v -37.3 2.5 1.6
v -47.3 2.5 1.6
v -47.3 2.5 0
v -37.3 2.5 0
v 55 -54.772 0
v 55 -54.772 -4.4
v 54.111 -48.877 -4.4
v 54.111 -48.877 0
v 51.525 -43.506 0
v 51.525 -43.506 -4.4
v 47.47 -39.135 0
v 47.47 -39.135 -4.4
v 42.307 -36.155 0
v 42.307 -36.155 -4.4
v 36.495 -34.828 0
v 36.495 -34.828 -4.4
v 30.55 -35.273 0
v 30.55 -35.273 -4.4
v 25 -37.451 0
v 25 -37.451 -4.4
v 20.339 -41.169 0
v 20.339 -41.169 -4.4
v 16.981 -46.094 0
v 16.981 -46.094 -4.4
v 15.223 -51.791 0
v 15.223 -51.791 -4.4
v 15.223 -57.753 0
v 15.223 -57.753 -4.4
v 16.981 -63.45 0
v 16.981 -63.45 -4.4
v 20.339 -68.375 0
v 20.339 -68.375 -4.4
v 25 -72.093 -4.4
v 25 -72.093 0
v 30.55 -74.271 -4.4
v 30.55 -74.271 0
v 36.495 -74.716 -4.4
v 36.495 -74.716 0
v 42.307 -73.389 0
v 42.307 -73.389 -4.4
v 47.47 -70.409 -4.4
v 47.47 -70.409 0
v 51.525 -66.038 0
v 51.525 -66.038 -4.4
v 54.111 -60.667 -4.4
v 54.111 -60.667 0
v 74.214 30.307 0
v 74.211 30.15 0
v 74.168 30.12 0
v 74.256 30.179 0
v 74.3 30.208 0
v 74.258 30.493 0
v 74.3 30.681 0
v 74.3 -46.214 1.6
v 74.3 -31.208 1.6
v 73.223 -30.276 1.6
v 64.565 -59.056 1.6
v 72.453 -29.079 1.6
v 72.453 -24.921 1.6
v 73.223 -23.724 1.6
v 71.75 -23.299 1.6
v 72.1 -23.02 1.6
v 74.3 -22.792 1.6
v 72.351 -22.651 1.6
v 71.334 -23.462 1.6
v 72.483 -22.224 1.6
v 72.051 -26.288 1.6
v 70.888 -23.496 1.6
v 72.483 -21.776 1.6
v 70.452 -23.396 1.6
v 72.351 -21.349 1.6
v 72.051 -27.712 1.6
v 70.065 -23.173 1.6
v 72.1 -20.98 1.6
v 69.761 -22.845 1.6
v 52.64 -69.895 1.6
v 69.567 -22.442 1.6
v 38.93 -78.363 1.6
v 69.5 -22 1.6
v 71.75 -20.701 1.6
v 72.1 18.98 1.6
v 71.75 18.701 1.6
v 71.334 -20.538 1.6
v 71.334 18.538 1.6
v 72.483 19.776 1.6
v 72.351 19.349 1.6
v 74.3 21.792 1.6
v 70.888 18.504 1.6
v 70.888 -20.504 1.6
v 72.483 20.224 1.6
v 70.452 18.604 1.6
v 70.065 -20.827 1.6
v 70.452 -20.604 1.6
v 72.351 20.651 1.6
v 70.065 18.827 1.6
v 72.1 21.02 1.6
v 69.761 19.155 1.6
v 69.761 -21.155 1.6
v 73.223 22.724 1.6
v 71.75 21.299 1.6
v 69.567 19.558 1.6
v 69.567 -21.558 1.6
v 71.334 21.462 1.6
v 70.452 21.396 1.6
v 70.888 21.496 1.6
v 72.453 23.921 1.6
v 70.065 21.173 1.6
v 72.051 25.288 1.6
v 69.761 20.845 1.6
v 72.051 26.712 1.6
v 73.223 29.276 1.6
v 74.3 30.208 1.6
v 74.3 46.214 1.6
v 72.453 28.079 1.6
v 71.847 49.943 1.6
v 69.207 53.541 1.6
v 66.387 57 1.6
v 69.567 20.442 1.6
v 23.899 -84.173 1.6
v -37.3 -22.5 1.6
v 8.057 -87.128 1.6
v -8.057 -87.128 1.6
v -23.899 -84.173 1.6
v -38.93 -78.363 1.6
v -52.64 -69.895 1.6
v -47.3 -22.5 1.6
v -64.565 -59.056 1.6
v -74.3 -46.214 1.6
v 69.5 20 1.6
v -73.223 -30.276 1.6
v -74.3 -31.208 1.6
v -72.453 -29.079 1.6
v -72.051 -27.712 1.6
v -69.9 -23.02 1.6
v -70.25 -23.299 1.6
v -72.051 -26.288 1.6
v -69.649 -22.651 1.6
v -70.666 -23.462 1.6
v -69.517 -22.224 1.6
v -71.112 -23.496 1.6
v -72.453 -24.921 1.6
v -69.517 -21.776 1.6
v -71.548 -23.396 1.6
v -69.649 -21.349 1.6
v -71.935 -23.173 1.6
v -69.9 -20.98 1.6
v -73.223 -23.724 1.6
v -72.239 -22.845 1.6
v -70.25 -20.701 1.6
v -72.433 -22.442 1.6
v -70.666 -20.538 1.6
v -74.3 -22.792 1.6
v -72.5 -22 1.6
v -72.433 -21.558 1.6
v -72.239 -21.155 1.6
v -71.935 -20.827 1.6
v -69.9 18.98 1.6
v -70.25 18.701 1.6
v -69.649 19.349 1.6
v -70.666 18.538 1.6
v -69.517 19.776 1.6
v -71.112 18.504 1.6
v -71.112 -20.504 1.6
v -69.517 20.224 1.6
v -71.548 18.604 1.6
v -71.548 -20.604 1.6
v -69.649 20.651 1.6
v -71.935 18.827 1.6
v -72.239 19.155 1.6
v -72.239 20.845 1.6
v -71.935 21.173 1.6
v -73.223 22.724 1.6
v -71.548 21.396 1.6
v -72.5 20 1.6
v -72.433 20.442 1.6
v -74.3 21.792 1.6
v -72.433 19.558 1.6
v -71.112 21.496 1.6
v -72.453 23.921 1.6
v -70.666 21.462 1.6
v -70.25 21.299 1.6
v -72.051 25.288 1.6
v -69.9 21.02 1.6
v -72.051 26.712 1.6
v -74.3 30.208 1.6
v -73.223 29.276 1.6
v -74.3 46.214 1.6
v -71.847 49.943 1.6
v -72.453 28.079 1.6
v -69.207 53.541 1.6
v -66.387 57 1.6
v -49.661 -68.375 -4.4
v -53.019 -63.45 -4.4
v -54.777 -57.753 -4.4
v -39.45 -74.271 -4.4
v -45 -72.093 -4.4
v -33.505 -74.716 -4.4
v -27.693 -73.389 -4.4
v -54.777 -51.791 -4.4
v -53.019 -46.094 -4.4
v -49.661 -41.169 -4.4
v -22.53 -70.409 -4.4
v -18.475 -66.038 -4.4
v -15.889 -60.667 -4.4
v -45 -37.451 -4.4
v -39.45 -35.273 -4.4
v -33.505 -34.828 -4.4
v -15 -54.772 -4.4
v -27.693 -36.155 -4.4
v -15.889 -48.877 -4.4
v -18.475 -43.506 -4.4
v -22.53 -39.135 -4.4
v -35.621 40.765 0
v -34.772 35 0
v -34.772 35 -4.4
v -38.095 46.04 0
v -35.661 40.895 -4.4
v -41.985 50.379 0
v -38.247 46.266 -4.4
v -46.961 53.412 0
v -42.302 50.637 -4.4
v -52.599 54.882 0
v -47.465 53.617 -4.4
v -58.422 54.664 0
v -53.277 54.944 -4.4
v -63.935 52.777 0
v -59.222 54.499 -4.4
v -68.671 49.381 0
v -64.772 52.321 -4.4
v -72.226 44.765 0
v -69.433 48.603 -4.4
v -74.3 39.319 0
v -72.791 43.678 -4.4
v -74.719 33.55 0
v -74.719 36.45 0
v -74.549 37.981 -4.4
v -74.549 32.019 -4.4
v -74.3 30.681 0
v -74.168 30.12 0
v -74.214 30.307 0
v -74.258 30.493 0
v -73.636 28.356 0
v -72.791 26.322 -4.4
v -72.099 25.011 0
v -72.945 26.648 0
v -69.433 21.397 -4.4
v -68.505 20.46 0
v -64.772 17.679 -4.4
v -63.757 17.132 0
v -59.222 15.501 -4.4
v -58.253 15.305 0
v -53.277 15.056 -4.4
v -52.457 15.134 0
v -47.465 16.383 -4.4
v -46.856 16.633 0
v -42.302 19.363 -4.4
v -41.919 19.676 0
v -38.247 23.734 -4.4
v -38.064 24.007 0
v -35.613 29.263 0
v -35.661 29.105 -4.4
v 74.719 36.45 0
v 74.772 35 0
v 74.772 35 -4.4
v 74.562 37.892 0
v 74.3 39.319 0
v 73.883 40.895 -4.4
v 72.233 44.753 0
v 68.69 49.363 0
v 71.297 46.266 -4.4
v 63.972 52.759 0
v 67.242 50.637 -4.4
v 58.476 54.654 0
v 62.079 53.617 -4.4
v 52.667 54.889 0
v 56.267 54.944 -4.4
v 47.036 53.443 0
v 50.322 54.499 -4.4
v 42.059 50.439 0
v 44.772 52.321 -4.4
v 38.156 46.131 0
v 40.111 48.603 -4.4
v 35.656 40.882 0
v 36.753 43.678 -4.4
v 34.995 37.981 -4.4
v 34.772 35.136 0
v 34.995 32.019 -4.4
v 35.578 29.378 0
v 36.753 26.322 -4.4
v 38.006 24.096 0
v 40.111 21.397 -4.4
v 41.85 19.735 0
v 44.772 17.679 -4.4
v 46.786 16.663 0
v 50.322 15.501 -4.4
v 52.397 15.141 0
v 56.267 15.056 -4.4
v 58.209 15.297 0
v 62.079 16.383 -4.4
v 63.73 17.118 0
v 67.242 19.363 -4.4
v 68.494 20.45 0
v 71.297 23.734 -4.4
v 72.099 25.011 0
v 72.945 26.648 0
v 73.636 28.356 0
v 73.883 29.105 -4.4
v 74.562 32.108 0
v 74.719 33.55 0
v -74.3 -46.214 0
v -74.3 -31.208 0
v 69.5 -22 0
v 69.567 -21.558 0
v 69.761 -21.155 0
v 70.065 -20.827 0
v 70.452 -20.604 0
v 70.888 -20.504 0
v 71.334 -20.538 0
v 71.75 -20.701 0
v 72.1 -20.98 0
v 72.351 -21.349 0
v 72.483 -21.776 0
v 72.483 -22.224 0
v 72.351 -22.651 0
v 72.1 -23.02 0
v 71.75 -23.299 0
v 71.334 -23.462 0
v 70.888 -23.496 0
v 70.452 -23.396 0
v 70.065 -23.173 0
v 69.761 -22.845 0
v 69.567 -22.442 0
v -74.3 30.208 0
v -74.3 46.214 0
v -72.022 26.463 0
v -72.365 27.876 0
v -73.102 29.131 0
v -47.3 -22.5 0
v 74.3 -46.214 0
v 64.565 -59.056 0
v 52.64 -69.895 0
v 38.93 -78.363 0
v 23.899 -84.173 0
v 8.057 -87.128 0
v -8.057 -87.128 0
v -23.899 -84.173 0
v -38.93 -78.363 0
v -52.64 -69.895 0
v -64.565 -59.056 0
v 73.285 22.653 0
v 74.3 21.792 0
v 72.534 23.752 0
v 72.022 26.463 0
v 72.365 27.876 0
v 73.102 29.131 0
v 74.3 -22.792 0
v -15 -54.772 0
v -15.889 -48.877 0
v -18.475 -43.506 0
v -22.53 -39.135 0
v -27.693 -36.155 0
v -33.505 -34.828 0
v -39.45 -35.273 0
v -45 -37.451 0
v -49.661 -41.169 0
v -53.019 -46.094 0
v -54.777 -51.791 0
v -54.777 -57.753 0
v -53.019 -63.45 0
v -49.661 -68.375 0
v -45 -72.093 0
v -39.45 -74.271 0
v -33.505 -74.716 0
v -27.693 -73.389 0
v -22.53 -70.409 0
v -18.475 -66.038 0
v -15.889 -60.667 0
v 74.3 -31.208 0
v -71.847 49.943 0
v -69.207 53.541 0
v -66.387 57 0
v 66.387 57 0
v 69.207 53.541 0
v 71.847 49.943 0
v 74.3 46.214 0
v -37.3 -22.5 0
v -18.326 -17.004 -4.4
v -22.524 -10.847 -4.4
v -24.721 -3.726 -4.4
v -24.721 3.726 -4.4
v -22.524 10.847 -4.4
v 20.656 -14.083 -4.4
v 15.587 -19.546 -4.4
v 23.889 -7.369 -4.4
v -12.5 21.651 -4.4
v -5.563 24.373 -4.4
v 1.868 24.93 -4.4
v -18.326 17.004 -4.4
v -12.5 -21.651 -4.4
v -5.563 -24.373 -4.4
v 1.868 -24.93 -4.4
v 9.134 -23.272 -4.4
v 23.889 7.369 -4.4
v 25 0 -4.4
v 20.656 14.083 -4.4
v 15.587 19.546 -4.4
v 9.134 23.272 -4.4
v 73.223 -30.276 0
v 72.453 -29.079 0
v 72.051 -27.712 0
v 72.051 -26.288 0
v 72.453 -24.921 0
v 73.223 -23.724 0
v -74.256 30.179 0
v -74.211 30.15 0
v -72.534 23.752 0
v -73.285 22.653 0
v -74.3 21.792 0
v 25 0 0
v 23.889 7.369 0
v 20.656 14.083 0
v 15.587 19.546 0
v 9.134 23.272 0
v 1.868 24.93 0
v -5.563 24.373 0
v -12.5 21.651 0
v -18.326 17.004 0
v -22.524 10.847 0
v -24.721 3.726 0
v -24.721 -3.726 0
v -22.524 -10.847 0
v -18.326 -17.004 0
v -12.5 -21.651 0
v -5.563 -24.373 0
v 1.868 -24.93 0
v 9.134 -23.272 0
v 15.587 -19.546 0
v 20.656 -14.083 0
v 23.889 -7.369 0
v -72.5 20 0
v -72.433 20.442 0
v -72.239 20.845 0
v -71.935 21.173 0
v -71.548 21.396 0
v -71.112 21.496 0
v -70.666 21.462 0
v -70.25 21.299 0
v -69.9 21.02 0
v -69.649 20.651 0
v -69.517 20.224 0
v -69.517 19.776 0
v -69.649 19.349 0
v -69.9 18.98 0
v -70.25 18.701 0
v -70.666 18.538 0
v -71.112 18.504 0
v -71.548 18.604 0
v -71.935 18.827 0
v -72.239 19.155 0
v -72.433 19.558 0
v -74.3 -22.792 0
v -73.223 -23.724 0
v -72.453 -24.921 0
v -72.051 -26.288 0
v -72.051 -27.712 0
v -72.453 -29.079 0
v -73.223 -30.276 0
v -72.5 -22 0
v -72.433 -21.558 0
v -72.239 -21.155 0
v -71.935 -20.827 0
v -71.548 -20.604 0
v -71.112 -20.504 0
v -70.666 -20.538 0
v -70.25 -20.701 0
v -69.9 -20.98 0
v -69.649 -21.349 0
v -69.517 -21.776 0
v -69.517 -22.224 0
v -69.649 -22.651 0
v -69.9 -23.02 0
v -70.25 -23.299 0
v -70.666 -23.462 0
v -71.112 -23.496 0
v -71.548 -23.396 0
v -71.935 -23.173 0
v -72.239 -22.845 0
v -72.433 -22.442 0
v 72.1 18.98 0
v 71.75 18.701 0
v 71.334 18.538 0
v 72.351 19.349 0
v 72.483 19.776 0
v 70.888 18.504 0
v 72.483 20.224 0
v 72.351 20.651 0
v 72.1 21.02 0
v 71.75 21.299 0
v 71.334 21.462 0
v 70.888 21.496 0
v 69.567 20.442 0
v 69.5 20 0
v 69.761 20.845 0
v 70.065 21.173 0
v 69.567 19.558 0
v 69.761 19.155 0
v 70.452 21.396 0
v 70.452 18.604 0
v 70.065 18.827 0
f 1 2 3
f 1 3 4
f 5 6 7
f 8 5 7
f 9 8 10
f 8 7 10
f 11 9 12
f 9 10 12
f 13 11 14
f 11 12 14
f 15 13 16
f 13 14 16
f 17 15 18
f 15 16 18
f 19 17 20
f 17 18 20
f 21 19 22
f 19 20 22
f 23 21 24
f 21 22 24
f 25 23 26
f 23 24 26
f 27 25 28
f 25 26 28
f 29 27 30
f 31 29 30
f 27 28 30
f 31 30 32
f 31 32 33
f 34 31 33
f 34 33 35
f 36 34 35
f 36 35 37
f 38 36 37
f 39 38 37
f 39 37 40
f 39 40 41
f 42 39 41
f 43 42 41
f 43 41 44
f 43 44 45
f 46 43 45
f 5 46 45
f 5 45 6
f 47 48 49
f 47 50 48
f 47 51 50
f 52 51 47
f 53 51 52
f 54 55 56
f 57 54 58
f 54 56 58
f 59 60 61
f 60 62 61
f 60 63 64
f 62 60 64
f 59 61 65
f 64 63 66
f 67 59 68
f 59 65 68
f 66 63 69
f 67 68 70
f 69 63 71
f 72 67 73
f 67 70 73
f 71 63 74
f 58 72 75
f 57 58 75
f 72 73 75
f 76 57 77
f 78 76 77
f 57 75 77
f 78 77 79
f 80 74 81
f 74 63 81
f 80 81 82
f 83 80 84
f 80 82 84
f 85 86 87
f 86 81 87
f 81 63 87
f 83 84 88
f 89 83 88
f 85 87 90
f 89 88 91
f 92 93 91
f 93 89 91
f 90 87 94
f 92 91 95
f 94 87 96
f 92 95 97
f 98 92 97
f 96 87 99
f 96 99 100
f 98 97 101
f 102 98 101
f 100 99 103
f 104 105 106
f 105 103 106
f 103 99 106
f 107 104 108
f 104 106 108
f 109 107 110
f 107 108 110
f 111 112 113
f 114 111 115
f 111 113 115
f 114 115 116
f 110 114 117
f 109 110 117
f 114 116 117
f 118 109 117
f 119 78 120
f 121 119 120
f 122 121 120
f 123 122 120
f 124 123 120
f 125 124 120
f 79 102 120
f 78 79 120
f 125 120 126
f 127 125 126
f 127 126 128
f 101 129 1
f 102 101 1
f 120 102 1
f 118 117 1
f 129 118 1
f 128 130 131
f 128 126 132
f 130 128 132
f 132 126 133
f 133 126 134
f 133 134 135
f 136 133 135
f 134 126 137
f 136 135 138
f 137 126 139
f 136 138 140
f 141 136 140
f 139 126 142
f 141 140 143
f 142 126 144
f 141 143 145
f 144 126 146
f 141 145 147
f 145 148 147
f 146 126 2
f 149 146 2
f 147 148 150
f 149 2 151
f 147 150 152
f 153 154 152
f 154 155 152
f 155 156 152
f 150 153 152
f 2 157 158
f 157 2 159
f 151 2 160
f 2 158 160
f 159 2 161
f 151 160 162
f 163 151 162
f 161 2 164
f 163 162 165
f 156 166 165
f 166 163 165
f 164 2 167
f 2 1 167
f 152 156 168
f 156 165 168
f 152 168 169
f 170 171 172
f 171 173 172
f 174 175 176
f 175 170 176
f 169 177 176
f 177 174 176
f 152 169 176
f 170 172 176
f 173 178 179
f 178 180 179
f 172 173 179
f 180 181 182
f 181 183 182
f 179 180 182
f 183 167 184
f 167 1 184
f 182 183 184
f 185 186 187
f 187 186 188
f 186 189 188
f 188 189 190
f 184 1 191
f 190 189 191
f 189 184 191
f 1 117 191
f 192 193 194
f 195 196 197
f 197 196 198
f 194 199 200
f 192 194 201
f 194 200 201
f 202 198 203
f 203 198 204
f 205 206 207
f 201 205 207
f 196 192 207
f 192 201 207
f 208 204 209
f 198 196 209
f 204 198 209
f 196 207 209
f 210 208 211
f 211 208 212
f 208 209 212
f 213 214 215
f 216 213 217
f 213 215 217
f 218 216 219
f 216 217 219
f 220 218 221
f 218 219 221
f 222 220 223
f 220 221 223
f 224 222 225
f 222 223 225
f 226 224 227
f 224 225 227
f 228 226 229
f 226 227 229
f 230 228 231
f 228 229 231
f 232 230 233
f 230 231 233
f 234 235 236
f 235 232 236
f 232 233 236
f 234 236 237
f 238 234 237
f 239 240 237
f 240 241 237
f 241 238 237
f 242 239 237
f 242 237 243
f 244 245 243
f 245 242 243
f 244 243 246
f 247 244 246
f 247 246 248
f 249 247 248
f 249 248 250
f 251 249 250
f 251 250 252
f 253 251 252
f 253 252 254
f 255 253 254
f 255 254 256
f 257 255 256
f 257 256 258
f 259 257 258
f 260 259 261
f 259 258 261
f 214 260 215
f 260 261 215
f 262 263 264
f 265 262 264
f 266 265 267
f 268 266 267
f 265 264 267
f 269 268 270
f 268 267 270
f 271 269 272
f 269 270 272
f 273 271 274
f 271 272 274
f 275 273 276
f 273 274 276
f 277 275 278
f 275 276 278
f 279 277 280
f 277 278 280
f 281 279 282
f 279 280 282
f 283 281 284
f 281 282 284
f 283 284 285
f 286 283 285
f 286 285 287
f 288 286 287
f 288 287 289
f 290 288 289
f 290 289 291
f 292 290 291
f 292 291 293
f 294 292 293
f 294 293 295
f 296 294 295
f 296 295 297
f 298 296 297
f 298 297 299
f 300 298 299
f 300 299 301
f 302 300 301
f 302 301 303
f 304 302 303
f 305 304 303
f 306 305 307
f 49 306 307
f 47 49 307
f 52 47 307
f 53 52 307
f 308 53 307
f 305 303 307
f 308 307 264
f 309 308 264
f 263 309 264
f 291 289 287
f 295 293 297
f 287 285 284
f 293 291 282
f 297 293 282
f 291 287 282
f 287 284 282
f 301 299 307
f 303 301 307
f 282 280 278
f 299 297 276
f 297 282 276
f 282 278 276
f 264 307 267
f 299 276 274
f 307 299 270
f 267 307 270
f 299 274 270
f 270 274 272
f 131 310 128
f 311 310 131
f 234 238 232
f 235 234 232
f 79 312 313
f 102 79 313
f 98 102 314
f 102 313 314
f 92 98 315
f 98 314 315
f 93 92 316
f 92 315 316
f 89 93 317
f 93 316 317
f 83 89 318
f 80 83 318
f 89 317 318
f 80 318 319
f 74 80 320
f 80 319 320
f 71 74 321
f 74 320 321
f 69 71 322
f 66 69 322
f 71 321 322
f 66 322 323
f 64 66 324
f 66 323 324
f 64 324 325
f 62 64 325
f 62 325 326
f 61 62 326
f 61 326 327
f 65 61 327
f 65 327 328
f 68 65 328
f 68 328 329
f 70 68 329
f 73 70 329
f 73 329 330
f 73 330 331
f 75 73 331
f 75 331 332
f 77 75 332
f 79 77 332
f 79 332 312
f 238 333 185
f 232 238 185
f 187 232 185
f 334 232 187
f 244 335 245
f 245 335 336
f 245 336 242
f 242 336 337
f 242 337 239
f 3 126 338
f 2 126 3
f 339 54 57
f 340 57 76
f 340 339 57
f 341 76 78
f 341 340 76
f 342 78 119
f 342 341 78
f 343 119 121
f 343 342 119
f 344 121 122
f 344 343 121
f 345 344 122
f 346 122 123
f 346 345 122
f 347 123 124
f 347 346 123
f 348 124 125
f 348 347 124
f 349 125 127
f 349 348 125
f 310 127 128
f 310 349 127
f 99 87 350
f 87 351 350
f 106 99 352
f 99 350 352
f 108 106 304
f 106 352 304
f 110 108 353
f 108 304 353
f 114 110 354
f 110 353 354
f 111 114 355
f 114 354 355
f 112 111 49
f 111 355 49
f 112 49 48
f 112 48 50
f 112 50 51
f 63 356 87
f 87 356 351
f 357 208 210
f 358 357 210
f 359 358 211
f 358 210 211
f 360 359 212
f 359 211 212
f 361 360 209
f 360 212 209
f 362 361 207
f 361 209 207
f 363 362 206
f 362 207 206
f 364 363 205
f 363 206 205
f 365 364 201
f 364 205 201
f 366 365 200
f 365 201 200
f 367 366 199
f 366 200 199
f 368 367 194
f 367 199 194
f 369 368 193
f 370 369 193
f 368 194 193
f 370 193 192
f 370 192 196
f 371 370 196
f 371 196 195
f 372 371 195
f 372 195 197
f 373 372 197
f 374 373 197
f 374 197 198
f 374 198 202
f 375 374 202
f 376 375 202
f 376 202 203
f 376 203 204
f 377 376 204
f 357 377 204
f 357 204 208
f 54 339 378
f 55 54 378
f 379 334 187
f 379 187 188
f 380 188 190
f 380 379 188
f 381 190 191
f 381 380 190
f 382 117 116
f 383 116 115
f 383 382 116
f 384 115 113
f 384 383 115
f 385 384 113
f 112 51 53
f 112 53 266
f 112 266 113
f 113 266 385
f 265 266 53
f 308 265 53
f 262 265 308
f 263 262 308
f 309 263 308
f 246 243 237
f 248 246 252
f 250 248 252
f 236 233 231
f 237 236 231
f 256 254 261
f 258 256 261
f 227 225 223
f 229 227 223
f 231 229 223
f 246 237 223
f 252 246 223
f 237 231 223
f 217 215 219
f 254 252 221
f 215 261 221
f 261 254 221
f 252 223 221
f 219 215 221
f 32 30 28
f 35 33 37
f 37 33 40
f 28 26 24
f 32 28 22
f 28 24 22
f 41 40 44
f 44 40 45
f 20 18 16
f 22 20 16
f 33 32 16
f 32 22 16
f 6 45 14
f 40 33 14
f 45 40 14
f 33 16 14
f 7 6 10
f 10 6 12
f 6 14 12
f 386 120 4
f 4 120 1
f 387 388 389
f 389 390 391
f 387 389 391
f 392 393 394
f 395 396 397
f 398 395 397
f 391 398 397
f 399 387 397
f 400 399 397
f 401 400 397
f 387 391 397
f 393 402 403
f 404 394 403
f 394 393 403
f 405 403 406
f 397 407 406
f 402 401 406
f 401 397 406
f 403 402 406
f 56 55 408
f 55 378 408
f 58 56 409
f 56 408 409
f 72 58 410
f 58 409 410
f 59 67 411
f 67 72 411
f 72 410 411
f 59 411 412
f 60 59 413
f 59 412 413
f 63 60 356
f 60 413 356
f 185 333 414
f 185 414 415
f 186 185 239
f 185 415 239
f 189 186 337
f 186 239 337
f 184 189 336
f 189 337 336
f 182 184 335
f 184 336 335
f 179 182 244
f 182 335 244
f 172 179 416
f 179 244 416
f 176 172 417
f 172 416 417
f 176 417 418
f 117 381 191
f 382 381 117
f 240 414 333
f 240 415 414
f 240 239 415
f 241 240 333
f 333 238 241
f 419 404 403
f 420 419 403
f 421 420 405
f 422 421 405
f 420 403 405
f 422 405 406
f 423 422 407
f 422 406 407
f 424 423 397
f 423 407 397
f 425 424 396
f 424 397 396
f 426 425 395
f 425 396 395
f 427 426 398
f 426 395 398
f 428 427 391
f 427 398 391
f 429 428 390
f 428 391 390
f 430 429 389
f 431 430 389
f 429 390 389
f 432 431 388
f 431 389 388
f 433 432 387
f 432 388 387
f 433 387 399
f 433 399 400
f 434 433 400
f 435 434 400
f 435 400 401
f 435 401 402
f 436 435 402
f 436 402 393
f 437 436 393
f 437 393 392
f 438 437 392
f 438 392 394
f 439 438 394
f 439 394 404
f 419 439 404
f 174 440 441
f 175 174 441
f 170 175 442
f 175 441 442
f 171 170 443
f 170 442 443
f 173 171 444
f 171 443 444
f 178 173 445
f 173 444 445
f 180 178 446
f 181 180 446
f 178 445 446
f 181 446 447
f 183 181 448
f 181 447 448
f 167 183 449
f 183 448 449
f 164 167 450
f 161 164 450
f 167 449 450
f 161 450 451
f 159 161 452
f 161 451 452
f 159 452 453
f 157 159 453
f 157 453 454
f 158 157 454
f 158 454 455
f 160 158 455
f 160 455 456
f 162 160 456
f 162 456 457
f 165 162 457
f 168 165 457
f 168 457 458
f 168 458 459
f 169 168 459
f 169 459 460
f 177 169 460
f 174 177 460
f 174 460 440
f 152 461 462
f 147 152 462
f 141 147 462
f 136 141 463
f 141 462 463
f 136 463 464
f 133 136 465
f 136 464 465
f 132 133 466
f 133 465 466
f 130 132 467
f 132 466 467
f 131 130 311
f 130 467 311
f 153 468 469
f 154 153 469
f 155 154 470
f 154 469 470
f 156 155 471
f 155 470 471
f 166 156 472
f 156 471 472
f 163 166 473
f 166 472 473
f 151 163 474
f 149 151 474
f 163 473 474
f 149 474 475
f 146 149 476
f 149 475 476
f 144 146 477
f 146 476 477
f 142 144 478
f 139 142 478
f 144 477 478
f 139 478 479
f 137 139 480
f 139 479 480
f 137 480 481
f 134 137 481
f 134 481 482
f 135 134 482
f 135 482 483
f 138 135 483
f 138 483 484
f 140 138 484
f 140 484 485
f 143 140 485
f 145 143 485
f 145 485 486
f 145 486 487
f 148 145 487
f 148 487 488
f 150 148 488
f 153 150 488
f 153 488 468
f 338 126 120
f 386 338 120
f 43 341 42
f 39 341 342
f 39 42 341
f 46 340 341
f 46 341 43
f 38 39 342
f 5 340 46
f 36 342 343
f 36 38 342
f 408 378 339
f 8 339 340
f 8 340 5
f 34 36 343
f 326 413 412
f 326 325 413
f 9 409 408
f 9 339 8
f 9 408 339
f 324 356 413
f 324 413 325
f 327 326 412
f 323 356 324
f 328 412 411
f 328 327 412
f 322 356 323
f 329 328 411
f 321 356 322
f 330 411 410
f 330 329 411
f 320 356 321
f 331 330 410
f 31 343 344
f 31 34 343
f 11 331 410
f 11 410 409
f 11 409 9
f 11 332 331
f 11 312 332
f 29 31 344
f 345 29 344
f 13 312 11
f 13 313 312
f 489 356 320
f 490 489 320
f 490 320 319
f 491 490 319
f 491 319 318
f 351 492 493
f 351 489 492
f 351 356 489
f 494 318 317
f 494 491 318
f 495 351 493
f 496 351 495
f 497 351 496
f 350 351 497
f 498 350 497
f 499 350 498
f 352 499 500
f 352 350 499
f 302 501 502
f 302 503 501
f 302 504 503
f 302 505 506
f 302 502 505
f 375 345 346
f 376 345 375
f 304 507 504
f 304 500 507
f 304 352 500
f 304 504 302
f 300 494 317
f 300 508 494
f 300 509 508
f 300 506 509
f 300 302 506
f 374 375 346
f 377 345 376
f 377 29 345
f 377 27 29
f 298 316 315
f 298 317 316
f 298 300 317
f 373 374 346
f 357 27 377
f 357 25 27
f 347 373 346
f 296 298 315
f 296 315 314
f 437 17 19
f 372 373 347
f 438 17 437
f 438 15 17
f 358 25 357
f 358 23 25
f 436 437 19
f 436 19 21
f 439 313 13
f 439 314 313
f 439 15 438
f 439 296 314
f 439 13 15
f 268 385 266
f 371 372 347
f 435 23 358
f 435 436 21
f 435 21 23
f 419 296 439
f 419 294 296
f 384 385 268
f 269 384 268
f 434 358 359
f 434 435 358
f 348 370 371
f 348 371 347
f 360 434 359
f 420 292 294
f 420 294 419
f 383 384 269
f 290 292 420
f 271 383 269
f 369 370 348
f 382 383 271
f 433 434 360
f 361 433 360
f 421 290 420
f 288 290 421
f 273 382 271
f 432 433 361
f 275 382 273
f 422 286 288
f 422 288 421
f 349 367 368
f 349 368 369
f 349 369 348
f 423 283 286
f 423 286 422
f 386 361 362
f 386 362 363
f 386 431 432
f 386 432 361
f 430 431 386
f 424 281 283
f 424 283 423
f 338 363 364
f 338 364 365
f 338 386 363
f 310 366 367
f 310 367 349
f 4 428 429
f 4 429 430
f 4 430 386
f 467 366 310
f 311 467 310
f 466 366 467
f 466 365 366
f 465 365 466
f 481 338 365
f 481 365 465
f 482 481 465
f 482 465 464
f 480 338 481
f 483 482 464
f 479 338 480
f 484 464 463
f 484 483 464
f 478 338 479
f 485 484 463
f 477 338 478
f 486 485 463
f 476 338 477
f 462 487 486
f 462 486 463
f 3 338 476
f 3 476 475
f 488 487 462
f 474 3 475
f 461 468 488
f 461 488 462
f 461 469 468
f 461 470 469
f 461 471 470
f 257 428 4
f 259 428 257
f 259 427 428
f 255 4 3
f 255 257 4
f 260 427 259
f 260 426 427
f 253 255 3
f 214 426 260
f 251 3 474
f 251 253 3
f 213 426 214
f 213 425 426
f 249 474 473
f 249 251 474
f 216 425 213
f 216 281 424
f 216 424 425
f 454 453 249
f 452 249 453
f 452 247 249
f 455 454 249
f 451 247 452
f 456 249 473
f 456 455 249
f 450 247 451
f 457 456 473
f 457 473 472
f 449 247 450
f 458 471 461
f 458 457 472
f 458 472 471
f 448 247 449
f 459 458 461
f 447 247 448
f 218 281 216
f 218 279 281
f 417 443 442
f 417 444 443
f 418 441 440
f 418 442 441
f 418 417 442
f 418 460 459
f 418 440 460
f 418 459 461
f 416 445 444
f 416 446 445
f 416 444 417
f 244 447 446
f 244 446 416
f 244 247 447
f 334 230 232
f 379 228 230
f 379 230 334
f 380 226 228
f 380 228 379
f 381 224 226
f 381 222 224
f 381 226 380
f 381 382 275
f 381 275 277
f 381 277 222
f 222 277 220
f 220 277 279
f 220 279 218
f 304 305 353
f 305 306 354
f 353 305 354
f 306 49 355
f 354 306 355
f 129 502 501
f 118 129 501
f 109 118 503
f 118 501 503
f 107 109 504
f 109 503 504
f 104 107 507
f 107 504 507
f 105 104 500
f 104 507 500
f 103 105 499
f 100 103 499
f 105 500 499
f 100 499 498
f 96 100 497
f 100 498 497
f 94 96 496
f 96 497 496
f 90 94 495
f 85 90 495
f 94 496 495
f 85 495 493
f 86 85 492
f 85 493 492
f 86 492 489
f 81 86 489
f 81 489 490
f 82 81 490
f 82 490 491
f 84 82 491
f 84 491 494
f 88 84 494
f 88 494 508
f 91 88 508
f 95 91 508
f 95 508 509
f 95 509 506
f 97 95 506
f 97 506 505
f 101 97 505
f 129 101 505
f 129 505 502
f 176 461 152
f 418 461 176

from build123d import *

# Parameters (mm, degrees)
SKETCH_1_R           = 25
SKETCH_1_R_2         = 20
EXTRUDE_1_DEPTH      = 1.6
EXTRUDE_START        = -6
SKETCH_4_R           = 20
SKETCH_4_R_2         = 25
EXTRUDE_2_DEPTH      = 6
SKETCH_5_OUTSIDE_W   = 222.406
SKETCH_5_OUTSIDE_H   = 191.906
SKETCH_5_OUTSIDE_W_2 = 148.6
SKETCH_5_OUTSIDE_H_2 = 200
CUT_EXTRUDE_1_DEPTH  = 10
SKETCH_6_R           = 5
CUT_EXTRUDE_2_DEPTH  = 10
SKETCH_8_W           = 10
SKETCH_8_H           = 25
CUT_EXTRUDE_4_DEPTH  = 10
SKETCH_9_R           = 1.5
CUT_EXTRUDE_5_DEPTH  = 116.180128425


with BuildPart() as part:
    # 草图1 → 凸台-拉伸1 (new body)
    with BuildSketch(Plane.XY):
        with BuildLine():
            Line((-66.387122245, 57), (66.387122245, 57))
            ThreePointArc((66.387122245, 57), (0, -87.5), (-66.387122245, 57))
        make_face()
        Circle(SKETCH_1_R, mode=Mode.SUBTRACT)
        with Locations((54.772, 35)):
            Circle(SKETCH_1_R_2, mode=Mode.SUBTRACT)
        with Locations(Location((-54.772, 35, 0), (0, 0, 180))):
            Circle(SKETCH_1_R_2, mode=Mode.SUBTRACT)
        with Locations((35, -54.772)):
            Circle(SKETCH_1_R_2, mode=Mode.SUBTRACT)
        with Locations((-35, -54.772)):
            Circle(SKETCH_1_R_2, mode=Mode.SUBTRACT)
    extrude(amount=EXTRUDE_1_DEPTH)

    # 草图4 → 凸台-拉伸2 (add)
    with BuildSketch(Plane.XY.offset(1.6).offset(EXTRUDE_START)):
        with Locations((-54.772, 35)):
            Circle(SKETCH_4_R)
        Circle(SKETCH_4_R_2)
        with Locations((54.772, 35)):
            Circle(SKETCH_4_R)
        with Locations((-35, -54.772)):
            Circle(SKETCH_4_R)
        with Locations((35, -54.772)):
            Circle(SKETCH_4_R)
    extrude(amount=EXTRUDE_2_DEPTH)

    # 草图5 outside → 切除-拉伸1 (cut)
    with BuildSketch(Plane(origin=(0, 0, 0), x_dir=(-1, 0, 0), z_dir=(0, 0, -1))):
        with Locations((0, -15.25)):
            Rectangle(SKETCH_5_OUTSIDE_W, SKETCH_5_OUTSIDE_H)
        Rectangle(SKETCH_5_OUTSIDE_W_2, SKETCH_5_OUTSIDE_H_2, mode=Mode.SUBTRACT)
    extrude(amount=-CUT_EXTRUDE_1_DEPTH, mode=Mode.SUBTRACT)

    # 草图6 → 切除-拉伸2 (cut)
    with BuildSketch(Plane(origin=(0, 0, 0), x_dir=(-1, 0, 0), z_dir=(0, 0, -1))):
        with Locations((-77, -27)):
            Circle(SKETCH_6_R)
        with Locations((-77, 26)):
            Circle(SKETCH_6_R)
        with Locations((77, 26)):
            Circle(SKETCH_6_R)
        with Locations((77, -27)):
            Circle(SKETCH_6_R)
    extrude(amount=-CUT_EXTRUDE_2_DEPTH, mode=Mode.SUBTRACT)

    # 草图8 → 切除-拉伸4 (cut)
    with BuildSketch(Plane.XY.offset(1.6)):
        with Locations((-42.3, -10)):
            Rectangle(SKETCH_8_W, SKETCH_8_H)
    extrude(amount=-CUT_EXTRUDE_4_DEPTH, mode=Mode.SUBTRACT)

    # 草图9 → 切除-拉伸5 (cut, through all)
    with BuildSketch(Plane(origin=(0, 0, 0), x_dir=(-1, 0, 0), z_dir=(0, 0, -1))):
        with Locations((-71, 20)):
            Circle(SKETCH_9_R)
        with Locations((-71, -22)):
            Circle(SKETCH_9_R)
        with Locations((71, 20)):
            Circle(SKETCH_9_R)
        with Locations((71, -22)):
            Circle(SKETCH_9_R)
    extrude(amount=-CUT_EXTRUDE_5_DEPTH, mode=Mode.SUBTRACT)


solid = part.part
